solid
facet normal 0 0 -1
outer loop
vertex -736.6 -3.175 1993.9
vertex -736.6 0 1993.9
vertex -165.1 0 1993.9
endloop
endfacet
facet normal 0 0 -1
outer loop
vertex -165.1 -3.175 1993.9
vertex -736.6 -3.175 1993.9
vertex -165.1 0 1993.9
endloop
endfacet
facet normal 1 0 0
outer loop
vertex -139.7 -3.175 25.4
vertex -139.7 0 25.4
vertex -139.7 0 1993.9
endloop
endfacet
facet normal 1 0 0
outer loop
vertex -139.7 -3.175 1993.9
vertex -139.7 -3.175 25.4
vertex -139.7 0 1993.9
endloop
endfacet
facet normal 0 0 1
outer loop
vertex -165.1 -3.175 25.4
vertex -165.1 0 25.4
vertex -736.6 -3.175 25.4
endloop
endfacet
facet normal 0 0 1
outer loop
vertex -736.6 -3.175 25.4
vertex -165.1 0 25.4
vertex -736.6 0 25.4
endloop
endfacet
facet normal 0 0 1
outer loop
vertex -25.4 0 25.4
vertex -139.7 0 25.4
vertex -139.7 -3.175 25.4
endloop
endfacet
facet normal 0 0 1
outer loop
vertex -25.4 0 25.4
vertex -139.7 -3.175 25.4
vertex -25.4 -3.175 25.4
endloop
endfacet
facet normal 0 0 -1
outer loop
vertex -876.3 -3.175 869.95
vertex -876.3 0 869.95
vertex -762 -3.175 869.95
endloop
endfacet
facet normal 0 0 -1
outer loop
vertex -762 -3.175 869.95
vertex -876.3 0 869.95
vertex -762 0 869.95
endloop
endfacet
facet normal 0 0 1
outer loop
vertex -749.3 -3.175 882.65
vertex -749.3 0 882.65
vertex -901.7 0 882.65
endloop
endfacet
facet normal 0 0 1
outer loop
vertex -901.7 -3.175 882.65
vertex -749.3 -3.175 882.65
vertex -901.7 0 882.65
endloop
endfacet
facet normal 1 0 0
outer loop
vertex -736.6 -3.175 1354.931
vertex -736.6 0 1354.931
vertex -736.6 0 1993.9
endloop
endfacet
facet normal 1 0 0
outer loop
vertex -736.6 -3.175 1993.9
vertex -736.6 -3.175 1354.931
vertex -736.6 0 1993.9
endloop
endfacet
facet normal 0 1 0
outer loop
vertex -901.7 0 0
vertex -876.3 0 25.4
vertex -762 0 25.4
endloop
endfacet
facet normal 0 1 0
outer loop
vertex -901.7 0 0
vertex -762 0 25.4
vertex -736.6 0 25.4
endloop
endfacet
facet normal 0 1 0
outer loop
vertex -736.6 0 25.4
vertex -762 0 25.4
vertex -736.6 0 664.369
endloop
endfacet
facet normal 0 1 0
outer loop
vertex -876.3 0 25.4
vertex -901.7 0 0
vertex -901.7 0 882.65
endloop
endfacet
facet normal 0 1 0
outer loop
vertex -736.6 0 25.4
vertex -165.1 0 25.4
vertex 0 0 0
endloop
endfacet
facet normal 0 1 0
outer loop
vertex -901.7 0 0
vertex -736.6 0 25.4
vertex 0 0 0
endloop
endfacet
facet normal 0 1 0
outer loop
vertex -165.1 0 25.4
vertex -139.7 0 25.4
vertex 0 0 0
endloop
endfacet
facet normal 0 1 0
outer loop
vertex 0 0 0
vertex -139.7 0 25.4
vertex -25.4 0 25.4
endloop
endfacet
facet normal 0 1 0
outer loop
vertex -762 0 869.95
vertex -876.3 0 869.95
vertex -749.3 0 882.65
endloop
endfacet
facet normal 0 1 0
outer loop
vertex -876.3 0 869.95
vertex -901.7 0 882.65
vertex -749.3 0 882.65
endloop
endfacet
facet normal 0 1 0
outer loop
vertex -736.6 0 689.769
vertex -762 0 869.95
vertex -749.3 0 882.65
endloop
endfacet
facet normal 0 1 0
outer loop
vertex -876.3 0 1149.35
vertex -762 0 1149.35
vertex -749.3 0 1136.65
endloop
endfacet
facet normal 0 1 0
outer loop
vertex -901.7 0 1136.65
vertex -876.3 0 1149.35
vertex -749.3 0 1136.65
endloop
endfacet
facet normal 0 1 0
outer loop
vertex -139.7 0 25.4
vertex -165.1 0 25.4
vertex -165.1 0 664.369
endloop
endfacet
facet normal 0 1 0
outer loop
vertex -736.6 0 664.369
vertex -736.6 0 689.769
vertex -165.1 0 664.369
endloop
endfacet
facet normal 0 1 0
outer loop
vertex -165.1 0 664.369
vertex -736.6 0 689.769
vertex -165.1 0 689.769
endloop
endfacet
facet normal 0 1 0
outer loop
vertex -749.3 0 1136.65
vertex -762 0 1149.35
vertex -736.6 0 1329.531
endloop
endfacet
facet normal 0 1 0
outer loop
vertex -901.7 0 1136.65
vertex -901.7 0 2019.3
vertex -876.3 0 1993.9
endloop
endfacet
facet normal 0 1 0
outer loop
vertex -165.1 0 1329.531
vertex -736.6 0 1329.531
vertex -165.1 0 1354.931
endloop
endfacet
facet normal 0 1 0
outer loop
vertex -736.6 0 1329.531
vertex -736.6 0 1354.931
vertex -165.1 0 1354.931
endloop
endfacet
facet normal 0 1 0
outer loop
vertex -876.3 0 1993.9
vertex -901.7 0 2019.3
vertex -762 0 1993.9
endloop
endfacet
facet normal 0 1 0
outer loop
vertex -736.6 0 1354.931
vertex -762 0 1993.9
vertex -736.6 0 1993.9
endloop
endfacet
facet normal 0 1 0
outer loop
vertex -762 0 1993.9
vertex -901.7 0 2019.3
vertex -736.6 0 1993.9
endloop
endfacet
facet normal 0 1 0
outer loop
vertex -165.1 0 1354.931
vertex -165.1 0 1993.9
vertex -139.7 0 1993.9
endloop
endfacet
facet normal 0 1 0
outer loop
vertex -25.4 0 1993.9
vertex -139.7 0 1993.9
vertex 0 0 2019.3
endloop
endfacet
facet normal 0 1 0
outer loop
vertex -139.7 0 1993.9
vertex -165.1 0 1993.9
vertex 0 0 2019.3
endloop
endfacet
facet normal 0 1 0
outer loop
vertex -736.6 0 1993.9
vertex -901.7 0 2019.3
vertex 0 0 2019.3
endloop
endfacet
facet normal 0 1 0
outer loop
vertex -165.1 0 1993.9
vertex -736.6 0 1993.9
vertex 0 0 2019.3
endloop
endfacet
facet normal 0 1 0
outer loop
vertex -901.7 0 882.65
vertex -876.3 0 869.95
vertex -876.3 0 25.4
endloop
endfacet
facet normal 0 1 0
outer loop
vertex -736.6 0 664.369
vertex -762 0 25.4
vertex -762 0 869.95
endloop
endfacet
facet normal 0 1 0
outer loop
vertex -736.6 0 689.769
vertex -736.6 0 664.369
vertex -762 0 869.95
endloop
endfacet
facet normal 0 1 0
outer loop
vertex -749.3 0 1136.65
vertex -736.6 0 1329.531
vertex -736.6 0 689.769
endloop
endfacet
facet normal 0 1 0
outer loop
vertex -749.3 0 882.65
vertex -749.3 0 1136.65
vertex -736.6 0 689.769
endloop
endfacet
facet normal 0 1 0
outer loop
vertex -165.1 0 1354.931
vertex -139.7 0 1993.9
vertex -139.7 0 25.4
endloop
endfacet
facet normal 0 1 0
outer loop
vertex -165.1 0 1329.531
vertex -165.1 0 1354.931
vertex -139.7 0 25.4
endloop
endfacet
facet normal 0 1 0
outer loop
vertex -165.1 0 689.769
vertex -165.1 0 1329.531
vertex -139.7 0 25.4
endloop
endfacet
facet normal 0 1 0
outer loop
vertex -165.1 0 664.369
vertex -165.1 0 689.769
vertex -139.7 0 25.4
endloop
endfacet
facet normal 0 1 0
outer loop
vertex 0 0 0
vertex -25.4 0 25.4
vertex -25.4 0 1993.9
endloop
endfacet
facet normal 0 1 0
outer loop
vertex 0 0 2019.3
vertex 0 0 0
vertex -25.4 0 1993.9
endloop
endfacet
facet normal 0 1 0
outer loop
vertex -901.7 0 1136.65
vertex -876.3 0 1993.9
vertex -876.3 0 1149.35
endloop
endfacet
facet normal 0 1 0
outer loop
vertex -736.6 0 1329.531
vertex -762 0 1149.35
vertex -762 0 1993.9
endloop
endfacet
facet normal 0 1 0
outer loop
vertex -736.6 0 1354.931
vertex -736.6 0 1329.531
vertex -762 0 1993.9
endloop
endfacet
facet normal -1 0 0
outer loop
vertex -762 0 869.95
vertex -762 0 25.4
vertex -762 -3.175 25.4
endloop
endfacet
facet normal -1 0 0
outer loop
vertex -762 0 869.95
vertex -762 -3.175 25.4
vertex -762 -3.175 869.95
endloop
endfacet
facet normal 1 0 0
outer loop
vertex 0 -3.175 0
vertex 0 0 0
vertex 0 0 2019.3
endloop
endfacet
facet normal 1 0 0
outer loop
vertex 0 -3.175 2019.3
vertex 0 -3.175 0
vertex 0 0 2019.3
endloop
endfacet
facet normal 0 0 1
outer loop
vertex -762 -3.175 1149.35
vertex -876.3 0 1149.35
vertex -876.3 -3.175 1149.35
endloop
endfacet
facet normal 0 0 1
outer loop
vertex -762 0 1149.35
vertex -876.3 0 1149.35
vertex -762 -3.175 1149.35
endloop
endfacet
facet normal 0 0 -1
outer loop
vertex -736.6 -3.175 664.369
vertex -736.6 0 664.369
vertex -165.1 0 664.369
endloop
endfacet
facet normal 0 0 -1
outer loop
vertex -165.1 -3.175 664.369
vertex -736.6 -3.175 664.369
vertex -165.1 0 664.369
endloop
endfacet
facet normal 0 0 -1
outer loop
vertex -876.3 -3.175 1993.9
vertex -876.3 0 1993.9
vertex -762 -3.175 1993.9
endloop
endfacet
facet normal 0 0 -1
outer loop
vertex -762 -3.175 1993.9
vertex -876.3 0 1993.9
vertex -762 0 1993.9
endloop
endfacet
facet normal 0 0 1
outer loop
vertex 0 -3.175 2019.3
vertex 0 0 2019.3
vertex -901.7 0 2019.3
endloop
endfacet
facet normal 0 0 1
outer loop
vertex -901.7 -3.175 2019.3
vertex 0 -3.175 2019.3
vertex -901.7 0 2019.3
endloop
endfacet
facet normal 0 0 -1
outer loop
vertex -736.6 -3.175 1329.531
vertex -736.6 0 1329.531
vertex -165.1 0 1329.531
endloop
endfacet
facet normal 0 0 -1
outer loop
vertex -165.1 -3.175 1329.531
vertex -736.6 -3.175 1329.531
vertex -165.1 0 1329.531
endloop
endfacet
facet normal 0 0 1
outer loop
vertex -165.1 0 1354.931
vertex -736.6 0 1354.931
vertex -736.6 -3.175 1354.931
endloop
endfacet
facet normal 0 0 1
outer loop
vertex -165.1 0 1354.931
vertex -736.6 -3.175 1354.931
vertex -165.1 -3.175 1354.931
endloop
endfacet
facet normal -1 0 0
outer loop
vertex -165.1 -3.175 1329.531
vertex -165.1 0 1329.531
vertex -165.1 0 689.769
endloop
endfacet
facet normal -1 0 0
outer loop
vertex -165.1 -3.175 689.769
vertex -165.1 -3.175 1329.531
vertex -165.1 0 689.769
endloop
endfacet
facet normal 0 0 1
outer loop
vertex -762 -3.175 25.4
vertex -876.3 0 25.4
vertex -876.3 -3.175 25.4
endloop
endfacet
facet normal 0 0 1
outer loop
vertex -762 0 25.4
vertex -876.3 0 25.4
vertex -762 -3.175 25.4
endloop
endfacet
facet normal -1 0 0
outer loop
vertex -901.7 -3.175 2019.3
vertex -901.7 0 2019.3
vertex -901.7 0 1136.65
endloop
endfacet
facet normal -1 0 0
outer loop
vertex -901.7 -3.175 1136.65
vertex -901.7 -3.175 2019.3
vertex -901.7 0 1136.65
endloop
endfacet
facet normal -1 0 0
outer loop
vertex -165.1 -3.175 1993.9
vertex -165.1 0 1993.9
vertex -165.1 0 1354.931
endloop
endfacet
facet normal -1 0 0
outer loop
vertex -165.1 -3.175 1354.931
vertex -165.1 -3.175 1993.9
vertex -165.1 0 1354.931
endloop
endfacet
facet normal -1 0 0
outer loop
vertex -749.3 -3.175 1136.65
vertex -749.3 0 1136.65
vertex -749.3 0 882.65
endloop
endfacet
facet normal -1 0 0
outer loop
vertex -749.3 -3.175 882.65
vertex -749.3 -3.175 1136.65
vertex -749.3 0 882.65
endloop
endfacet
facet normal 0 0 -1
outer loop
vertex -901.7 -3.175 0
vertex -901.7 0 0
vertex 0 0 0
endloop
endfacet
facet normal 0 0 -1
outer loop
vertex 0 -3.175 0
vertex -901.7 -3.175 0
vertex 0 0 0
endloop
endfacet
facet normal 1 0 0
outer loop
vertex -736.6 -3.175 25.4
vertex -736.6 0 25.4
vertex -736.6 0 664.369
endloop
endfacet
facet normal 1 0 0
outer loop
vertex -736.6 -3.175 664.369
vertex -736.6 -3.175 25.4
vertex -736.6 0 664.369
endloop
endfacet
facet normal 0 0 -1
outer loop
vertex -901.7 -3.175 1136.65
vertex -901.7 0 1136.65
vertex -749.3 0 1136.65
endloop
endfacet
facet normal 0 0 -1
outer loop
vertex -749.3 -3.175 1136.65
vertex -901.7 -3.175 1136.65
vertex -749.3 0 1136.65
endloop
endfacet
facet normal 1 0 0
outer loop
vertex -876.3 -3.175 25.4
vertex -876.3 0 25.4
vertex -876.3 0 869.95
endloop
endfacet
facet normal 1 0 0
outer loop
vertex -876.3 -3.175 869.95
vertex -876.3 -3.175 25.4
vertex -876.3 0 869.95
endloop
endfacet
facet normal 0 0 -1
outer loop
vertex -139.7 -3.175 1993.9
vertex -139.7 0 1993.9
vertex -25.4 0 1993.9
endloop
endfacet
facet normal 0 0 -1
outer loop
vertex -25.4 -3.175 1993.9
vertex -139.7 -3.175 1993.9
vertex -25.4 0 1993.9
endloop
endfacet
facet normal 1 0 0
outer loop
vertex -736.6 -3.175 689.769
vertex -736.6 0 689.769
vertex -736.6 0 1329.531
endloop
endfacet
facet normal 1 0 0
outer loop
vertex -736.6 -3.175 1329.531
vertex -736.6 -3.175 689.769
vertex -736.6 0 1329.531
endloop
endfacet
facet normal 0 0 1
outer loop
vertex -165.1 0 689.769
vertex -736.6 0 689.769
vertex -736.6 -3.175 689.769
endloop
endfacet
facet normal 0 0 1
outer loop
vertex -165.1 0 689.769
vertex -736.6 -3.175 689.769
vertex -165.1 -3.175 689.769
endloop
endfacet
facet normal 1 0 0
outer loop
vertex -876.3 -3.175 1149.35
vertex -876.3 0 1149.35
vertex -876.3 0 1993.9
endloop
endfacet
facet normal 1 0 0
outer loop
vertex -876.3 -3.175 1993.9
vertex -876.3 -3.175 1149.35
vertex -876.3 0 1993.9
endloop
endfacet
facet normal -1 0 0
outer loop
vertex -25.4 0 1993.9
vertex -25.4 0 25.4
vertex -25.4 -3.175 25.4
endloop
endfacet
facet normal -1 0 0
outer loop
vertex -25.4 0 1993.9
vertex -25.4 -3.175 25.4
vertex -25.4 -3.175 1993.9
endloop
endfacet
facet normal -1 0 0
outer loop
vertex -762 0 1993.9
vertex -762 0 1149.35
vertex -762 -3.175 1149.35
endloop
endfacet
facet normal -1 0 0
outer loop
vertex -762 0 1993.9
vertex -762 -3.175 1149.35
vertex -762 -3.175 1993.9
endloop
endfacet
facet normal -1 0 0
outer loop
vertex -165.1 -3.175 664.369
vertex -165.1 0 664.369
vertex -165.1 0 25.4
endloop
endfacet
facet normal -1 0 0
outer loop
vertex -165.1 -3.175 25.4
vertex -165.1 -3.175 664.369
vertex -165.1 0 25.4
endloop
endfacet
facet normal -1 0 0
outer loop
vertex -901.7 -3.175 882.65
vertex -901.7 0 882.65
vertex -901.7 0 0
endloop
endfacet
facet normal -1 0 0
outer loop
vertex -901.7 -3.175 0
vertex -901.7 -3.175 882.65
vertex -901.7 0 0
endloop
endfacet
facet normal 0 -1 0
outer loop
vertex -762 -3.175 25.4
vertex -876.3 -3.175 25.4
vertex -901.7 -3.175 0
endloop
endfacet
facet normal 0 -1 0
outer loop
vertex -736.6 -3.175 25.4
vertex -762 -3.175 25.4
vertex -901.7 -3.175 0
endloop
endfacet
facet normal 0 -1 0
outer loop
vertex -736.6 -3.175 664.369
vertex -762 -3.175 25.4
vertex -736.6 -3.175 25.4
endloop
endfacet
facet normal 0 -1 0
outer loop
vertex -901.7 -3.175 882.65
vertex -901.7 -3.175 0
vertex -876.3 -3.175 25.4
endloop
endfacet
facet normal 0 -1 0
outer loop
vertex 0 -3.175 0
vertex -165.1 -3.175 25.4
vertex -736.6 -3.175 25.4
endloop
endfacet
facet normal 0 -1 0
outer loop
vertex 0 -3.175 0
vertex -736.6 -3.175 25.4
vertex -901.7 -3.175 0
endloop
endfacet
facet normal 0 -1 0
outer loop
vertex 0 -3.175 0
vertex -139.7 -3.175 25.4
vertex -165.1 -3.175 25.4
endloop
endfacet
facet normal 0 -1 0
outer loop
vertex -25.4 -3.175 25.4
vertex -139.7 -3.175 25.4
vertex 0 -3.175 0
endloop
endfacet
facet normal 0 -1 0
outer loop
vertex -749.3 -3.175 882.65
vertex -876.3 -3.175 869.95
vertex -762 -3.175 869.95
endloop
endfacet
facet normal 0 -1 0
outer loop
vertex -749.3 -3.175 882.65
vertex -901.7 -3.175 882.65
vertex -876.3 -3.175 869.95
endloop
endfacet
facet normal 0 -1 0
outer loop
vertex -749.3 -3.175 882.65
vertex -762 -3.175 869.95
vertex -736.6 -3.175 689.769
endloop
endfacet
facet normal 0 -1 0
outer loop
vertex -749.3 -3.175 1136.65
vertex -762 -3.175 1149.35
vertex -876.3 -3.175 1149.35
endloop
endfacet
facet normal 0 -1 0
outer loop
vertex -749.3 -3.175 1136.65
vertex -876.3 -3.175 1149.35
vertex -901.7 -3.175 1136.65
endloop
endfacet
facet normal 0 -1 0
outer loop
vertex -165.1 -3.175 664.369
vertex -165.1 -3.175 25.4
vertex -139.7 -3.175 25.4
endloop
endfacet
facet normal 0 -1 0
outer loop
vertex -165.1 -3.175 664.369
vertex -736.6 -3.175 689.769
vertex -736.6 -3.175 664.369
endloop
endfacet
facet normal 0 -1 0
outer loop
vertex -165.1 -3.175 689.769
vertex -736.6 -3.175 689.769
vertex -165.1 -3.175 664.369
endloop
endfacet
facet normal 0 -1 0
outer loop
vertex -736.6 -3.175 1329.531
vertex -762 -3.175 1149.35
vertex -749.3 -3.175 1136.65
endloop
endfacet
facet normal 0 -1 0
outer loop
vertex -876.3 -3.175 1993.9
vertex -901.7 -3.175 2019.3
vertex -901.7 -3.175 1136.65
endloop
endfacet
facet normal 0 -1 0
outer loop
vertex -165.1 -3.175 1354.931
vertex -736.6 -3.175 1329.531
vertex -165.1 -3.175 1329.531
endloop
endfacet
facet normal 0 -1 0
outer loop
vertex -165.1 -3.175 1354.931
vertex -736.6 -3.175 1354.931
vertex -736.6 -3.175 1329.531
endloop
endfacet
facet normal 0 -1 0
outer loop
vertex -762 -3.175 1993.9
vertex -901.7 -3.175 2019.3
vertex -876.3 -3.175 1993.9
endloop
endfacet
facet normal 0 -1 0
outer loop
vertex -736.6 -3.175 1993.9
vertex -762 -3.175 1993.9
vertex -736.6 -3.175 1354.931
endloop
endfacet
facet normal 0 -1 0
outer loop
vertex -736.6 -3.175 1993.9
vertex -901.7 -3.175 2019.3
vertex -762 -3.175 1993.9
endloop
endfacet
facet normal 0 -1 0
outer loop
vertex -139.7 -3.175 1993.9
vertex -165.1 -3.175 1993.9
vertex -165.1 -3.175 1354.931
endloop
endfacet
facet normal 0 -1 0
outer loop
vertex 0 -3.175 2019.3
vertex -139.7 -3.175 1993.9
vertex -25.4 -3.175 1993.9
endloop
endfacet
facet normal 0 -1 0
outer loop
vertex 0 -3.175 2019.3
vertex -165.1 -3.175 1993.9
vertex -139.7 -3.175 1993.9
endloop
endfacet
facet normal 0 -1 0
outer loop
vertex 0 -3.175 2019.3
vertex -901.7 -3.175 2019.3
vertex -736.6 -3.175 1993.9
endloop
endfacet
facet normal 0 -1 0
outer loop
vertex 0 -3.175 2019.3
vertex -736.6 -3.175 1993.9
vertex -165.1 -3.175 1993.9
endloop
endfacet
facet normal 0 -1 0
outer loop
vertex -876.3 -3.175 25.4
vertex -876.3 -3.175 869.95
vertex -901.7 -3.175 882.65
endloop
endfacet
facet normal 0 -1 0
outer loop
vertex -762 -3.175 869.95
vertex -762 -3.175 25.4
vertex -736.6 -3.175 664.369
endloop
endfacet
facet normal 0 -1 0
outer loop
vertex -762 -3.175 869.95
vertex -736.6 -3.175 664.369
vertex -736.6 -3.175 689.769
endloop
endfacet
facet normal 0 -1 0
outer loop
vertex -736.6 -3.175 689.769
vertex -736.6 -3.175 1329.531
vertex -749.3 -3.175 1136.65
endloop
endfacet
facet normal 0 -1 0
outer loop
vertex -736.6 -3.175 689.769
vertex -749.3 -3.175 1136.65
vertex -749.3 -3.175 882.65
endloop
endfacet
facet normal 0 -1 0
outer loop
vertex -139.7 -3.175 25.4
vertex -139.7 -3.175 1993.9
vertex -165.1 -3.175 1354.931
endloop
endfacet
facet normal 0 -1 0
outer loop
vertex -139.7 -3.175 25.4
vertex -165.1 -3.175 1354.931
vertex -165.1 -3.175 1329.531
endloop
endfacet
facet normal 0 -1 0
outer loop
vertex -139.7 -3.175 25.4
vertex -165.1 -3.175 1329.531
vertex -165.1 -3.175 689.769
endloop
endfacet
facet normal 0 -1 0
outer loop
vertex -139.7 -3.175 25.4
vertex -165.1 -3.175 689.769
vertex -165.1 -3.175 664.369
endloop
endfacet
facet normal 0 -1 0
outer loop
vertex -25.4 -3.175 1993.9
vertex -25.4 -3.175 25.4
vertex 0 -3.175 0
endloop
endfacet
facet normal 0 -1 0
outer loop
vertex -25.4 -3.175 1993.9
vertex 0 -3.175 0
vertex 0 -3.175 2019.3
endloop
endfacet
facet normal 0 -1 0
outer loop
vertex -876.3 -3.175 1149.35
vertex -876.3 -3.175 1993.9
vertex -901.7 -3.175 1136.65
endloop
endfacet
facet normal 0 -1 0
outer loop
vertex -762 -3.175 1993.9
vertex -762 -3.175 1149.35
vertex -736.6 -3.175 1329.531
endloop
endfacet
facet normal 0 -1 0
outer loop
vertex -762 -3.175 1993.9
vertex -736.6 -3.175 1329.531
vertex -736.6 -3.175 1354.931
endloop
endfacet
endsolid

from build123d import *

# Parameters (mm, degrees)
F0_W     = 114.3
F0_H     = 844.55
F0_H_2   = 1968.5
F0_W_2   = 571.5
F0_H_3   = 25.4
F1_DEPTH = 3.175


with BuildPart() as f1:
    # F0 (on Front) → F1 (new body)
    with BuildSketch(Plane.XZ):
        Polygon((-901.7, 0), (0, 0), (0, 2019.3), (-901.7, 2019.3), (-901.7, 1136.65), (-749.3, 1136.65), (-749.3, 882.65), (-901.7, 882.65), align=None)
        with Locations((-819.15, 447.675)):
            Rectangle(F0_W, F0_H, mode=Mode.SUBTRACT)
        Polygon((-736.6, 1354.93125), (-736.6, 1993.9), (-165.1, 1993.9), (-165.1, 1354.93125), (-165.1, 1329.53125), (-165.1, 689.76875), (-165.1, 664.36875), (-165.1, 25.4), (-736.6, 25.4), (-736.6, 664.36875), (-736.6, 689.76875), (-736.6, 1329.53125), align=None, mode=Mode.SUBTRACT)
        with Locations((-819.15, 1571.625)):
            Rectangle(F0_W, F0_H, mode=Mode.SUBTRACT)
        with Locations((-82.55, 1009.65)):
            Rectangle(F0_W, F0_H_2, mode=Mode.SUBTRACT)
        with Locations((-450.85, 1342.23125)):
            Rectangle(F0_W_2, F0_H_3)
        with Locations((-450.85, 677.06875)):
            Rectangle(F0_W_2, F0_H_3)
    extrude(amount=F1_DEPTH)


solid = f1.part
